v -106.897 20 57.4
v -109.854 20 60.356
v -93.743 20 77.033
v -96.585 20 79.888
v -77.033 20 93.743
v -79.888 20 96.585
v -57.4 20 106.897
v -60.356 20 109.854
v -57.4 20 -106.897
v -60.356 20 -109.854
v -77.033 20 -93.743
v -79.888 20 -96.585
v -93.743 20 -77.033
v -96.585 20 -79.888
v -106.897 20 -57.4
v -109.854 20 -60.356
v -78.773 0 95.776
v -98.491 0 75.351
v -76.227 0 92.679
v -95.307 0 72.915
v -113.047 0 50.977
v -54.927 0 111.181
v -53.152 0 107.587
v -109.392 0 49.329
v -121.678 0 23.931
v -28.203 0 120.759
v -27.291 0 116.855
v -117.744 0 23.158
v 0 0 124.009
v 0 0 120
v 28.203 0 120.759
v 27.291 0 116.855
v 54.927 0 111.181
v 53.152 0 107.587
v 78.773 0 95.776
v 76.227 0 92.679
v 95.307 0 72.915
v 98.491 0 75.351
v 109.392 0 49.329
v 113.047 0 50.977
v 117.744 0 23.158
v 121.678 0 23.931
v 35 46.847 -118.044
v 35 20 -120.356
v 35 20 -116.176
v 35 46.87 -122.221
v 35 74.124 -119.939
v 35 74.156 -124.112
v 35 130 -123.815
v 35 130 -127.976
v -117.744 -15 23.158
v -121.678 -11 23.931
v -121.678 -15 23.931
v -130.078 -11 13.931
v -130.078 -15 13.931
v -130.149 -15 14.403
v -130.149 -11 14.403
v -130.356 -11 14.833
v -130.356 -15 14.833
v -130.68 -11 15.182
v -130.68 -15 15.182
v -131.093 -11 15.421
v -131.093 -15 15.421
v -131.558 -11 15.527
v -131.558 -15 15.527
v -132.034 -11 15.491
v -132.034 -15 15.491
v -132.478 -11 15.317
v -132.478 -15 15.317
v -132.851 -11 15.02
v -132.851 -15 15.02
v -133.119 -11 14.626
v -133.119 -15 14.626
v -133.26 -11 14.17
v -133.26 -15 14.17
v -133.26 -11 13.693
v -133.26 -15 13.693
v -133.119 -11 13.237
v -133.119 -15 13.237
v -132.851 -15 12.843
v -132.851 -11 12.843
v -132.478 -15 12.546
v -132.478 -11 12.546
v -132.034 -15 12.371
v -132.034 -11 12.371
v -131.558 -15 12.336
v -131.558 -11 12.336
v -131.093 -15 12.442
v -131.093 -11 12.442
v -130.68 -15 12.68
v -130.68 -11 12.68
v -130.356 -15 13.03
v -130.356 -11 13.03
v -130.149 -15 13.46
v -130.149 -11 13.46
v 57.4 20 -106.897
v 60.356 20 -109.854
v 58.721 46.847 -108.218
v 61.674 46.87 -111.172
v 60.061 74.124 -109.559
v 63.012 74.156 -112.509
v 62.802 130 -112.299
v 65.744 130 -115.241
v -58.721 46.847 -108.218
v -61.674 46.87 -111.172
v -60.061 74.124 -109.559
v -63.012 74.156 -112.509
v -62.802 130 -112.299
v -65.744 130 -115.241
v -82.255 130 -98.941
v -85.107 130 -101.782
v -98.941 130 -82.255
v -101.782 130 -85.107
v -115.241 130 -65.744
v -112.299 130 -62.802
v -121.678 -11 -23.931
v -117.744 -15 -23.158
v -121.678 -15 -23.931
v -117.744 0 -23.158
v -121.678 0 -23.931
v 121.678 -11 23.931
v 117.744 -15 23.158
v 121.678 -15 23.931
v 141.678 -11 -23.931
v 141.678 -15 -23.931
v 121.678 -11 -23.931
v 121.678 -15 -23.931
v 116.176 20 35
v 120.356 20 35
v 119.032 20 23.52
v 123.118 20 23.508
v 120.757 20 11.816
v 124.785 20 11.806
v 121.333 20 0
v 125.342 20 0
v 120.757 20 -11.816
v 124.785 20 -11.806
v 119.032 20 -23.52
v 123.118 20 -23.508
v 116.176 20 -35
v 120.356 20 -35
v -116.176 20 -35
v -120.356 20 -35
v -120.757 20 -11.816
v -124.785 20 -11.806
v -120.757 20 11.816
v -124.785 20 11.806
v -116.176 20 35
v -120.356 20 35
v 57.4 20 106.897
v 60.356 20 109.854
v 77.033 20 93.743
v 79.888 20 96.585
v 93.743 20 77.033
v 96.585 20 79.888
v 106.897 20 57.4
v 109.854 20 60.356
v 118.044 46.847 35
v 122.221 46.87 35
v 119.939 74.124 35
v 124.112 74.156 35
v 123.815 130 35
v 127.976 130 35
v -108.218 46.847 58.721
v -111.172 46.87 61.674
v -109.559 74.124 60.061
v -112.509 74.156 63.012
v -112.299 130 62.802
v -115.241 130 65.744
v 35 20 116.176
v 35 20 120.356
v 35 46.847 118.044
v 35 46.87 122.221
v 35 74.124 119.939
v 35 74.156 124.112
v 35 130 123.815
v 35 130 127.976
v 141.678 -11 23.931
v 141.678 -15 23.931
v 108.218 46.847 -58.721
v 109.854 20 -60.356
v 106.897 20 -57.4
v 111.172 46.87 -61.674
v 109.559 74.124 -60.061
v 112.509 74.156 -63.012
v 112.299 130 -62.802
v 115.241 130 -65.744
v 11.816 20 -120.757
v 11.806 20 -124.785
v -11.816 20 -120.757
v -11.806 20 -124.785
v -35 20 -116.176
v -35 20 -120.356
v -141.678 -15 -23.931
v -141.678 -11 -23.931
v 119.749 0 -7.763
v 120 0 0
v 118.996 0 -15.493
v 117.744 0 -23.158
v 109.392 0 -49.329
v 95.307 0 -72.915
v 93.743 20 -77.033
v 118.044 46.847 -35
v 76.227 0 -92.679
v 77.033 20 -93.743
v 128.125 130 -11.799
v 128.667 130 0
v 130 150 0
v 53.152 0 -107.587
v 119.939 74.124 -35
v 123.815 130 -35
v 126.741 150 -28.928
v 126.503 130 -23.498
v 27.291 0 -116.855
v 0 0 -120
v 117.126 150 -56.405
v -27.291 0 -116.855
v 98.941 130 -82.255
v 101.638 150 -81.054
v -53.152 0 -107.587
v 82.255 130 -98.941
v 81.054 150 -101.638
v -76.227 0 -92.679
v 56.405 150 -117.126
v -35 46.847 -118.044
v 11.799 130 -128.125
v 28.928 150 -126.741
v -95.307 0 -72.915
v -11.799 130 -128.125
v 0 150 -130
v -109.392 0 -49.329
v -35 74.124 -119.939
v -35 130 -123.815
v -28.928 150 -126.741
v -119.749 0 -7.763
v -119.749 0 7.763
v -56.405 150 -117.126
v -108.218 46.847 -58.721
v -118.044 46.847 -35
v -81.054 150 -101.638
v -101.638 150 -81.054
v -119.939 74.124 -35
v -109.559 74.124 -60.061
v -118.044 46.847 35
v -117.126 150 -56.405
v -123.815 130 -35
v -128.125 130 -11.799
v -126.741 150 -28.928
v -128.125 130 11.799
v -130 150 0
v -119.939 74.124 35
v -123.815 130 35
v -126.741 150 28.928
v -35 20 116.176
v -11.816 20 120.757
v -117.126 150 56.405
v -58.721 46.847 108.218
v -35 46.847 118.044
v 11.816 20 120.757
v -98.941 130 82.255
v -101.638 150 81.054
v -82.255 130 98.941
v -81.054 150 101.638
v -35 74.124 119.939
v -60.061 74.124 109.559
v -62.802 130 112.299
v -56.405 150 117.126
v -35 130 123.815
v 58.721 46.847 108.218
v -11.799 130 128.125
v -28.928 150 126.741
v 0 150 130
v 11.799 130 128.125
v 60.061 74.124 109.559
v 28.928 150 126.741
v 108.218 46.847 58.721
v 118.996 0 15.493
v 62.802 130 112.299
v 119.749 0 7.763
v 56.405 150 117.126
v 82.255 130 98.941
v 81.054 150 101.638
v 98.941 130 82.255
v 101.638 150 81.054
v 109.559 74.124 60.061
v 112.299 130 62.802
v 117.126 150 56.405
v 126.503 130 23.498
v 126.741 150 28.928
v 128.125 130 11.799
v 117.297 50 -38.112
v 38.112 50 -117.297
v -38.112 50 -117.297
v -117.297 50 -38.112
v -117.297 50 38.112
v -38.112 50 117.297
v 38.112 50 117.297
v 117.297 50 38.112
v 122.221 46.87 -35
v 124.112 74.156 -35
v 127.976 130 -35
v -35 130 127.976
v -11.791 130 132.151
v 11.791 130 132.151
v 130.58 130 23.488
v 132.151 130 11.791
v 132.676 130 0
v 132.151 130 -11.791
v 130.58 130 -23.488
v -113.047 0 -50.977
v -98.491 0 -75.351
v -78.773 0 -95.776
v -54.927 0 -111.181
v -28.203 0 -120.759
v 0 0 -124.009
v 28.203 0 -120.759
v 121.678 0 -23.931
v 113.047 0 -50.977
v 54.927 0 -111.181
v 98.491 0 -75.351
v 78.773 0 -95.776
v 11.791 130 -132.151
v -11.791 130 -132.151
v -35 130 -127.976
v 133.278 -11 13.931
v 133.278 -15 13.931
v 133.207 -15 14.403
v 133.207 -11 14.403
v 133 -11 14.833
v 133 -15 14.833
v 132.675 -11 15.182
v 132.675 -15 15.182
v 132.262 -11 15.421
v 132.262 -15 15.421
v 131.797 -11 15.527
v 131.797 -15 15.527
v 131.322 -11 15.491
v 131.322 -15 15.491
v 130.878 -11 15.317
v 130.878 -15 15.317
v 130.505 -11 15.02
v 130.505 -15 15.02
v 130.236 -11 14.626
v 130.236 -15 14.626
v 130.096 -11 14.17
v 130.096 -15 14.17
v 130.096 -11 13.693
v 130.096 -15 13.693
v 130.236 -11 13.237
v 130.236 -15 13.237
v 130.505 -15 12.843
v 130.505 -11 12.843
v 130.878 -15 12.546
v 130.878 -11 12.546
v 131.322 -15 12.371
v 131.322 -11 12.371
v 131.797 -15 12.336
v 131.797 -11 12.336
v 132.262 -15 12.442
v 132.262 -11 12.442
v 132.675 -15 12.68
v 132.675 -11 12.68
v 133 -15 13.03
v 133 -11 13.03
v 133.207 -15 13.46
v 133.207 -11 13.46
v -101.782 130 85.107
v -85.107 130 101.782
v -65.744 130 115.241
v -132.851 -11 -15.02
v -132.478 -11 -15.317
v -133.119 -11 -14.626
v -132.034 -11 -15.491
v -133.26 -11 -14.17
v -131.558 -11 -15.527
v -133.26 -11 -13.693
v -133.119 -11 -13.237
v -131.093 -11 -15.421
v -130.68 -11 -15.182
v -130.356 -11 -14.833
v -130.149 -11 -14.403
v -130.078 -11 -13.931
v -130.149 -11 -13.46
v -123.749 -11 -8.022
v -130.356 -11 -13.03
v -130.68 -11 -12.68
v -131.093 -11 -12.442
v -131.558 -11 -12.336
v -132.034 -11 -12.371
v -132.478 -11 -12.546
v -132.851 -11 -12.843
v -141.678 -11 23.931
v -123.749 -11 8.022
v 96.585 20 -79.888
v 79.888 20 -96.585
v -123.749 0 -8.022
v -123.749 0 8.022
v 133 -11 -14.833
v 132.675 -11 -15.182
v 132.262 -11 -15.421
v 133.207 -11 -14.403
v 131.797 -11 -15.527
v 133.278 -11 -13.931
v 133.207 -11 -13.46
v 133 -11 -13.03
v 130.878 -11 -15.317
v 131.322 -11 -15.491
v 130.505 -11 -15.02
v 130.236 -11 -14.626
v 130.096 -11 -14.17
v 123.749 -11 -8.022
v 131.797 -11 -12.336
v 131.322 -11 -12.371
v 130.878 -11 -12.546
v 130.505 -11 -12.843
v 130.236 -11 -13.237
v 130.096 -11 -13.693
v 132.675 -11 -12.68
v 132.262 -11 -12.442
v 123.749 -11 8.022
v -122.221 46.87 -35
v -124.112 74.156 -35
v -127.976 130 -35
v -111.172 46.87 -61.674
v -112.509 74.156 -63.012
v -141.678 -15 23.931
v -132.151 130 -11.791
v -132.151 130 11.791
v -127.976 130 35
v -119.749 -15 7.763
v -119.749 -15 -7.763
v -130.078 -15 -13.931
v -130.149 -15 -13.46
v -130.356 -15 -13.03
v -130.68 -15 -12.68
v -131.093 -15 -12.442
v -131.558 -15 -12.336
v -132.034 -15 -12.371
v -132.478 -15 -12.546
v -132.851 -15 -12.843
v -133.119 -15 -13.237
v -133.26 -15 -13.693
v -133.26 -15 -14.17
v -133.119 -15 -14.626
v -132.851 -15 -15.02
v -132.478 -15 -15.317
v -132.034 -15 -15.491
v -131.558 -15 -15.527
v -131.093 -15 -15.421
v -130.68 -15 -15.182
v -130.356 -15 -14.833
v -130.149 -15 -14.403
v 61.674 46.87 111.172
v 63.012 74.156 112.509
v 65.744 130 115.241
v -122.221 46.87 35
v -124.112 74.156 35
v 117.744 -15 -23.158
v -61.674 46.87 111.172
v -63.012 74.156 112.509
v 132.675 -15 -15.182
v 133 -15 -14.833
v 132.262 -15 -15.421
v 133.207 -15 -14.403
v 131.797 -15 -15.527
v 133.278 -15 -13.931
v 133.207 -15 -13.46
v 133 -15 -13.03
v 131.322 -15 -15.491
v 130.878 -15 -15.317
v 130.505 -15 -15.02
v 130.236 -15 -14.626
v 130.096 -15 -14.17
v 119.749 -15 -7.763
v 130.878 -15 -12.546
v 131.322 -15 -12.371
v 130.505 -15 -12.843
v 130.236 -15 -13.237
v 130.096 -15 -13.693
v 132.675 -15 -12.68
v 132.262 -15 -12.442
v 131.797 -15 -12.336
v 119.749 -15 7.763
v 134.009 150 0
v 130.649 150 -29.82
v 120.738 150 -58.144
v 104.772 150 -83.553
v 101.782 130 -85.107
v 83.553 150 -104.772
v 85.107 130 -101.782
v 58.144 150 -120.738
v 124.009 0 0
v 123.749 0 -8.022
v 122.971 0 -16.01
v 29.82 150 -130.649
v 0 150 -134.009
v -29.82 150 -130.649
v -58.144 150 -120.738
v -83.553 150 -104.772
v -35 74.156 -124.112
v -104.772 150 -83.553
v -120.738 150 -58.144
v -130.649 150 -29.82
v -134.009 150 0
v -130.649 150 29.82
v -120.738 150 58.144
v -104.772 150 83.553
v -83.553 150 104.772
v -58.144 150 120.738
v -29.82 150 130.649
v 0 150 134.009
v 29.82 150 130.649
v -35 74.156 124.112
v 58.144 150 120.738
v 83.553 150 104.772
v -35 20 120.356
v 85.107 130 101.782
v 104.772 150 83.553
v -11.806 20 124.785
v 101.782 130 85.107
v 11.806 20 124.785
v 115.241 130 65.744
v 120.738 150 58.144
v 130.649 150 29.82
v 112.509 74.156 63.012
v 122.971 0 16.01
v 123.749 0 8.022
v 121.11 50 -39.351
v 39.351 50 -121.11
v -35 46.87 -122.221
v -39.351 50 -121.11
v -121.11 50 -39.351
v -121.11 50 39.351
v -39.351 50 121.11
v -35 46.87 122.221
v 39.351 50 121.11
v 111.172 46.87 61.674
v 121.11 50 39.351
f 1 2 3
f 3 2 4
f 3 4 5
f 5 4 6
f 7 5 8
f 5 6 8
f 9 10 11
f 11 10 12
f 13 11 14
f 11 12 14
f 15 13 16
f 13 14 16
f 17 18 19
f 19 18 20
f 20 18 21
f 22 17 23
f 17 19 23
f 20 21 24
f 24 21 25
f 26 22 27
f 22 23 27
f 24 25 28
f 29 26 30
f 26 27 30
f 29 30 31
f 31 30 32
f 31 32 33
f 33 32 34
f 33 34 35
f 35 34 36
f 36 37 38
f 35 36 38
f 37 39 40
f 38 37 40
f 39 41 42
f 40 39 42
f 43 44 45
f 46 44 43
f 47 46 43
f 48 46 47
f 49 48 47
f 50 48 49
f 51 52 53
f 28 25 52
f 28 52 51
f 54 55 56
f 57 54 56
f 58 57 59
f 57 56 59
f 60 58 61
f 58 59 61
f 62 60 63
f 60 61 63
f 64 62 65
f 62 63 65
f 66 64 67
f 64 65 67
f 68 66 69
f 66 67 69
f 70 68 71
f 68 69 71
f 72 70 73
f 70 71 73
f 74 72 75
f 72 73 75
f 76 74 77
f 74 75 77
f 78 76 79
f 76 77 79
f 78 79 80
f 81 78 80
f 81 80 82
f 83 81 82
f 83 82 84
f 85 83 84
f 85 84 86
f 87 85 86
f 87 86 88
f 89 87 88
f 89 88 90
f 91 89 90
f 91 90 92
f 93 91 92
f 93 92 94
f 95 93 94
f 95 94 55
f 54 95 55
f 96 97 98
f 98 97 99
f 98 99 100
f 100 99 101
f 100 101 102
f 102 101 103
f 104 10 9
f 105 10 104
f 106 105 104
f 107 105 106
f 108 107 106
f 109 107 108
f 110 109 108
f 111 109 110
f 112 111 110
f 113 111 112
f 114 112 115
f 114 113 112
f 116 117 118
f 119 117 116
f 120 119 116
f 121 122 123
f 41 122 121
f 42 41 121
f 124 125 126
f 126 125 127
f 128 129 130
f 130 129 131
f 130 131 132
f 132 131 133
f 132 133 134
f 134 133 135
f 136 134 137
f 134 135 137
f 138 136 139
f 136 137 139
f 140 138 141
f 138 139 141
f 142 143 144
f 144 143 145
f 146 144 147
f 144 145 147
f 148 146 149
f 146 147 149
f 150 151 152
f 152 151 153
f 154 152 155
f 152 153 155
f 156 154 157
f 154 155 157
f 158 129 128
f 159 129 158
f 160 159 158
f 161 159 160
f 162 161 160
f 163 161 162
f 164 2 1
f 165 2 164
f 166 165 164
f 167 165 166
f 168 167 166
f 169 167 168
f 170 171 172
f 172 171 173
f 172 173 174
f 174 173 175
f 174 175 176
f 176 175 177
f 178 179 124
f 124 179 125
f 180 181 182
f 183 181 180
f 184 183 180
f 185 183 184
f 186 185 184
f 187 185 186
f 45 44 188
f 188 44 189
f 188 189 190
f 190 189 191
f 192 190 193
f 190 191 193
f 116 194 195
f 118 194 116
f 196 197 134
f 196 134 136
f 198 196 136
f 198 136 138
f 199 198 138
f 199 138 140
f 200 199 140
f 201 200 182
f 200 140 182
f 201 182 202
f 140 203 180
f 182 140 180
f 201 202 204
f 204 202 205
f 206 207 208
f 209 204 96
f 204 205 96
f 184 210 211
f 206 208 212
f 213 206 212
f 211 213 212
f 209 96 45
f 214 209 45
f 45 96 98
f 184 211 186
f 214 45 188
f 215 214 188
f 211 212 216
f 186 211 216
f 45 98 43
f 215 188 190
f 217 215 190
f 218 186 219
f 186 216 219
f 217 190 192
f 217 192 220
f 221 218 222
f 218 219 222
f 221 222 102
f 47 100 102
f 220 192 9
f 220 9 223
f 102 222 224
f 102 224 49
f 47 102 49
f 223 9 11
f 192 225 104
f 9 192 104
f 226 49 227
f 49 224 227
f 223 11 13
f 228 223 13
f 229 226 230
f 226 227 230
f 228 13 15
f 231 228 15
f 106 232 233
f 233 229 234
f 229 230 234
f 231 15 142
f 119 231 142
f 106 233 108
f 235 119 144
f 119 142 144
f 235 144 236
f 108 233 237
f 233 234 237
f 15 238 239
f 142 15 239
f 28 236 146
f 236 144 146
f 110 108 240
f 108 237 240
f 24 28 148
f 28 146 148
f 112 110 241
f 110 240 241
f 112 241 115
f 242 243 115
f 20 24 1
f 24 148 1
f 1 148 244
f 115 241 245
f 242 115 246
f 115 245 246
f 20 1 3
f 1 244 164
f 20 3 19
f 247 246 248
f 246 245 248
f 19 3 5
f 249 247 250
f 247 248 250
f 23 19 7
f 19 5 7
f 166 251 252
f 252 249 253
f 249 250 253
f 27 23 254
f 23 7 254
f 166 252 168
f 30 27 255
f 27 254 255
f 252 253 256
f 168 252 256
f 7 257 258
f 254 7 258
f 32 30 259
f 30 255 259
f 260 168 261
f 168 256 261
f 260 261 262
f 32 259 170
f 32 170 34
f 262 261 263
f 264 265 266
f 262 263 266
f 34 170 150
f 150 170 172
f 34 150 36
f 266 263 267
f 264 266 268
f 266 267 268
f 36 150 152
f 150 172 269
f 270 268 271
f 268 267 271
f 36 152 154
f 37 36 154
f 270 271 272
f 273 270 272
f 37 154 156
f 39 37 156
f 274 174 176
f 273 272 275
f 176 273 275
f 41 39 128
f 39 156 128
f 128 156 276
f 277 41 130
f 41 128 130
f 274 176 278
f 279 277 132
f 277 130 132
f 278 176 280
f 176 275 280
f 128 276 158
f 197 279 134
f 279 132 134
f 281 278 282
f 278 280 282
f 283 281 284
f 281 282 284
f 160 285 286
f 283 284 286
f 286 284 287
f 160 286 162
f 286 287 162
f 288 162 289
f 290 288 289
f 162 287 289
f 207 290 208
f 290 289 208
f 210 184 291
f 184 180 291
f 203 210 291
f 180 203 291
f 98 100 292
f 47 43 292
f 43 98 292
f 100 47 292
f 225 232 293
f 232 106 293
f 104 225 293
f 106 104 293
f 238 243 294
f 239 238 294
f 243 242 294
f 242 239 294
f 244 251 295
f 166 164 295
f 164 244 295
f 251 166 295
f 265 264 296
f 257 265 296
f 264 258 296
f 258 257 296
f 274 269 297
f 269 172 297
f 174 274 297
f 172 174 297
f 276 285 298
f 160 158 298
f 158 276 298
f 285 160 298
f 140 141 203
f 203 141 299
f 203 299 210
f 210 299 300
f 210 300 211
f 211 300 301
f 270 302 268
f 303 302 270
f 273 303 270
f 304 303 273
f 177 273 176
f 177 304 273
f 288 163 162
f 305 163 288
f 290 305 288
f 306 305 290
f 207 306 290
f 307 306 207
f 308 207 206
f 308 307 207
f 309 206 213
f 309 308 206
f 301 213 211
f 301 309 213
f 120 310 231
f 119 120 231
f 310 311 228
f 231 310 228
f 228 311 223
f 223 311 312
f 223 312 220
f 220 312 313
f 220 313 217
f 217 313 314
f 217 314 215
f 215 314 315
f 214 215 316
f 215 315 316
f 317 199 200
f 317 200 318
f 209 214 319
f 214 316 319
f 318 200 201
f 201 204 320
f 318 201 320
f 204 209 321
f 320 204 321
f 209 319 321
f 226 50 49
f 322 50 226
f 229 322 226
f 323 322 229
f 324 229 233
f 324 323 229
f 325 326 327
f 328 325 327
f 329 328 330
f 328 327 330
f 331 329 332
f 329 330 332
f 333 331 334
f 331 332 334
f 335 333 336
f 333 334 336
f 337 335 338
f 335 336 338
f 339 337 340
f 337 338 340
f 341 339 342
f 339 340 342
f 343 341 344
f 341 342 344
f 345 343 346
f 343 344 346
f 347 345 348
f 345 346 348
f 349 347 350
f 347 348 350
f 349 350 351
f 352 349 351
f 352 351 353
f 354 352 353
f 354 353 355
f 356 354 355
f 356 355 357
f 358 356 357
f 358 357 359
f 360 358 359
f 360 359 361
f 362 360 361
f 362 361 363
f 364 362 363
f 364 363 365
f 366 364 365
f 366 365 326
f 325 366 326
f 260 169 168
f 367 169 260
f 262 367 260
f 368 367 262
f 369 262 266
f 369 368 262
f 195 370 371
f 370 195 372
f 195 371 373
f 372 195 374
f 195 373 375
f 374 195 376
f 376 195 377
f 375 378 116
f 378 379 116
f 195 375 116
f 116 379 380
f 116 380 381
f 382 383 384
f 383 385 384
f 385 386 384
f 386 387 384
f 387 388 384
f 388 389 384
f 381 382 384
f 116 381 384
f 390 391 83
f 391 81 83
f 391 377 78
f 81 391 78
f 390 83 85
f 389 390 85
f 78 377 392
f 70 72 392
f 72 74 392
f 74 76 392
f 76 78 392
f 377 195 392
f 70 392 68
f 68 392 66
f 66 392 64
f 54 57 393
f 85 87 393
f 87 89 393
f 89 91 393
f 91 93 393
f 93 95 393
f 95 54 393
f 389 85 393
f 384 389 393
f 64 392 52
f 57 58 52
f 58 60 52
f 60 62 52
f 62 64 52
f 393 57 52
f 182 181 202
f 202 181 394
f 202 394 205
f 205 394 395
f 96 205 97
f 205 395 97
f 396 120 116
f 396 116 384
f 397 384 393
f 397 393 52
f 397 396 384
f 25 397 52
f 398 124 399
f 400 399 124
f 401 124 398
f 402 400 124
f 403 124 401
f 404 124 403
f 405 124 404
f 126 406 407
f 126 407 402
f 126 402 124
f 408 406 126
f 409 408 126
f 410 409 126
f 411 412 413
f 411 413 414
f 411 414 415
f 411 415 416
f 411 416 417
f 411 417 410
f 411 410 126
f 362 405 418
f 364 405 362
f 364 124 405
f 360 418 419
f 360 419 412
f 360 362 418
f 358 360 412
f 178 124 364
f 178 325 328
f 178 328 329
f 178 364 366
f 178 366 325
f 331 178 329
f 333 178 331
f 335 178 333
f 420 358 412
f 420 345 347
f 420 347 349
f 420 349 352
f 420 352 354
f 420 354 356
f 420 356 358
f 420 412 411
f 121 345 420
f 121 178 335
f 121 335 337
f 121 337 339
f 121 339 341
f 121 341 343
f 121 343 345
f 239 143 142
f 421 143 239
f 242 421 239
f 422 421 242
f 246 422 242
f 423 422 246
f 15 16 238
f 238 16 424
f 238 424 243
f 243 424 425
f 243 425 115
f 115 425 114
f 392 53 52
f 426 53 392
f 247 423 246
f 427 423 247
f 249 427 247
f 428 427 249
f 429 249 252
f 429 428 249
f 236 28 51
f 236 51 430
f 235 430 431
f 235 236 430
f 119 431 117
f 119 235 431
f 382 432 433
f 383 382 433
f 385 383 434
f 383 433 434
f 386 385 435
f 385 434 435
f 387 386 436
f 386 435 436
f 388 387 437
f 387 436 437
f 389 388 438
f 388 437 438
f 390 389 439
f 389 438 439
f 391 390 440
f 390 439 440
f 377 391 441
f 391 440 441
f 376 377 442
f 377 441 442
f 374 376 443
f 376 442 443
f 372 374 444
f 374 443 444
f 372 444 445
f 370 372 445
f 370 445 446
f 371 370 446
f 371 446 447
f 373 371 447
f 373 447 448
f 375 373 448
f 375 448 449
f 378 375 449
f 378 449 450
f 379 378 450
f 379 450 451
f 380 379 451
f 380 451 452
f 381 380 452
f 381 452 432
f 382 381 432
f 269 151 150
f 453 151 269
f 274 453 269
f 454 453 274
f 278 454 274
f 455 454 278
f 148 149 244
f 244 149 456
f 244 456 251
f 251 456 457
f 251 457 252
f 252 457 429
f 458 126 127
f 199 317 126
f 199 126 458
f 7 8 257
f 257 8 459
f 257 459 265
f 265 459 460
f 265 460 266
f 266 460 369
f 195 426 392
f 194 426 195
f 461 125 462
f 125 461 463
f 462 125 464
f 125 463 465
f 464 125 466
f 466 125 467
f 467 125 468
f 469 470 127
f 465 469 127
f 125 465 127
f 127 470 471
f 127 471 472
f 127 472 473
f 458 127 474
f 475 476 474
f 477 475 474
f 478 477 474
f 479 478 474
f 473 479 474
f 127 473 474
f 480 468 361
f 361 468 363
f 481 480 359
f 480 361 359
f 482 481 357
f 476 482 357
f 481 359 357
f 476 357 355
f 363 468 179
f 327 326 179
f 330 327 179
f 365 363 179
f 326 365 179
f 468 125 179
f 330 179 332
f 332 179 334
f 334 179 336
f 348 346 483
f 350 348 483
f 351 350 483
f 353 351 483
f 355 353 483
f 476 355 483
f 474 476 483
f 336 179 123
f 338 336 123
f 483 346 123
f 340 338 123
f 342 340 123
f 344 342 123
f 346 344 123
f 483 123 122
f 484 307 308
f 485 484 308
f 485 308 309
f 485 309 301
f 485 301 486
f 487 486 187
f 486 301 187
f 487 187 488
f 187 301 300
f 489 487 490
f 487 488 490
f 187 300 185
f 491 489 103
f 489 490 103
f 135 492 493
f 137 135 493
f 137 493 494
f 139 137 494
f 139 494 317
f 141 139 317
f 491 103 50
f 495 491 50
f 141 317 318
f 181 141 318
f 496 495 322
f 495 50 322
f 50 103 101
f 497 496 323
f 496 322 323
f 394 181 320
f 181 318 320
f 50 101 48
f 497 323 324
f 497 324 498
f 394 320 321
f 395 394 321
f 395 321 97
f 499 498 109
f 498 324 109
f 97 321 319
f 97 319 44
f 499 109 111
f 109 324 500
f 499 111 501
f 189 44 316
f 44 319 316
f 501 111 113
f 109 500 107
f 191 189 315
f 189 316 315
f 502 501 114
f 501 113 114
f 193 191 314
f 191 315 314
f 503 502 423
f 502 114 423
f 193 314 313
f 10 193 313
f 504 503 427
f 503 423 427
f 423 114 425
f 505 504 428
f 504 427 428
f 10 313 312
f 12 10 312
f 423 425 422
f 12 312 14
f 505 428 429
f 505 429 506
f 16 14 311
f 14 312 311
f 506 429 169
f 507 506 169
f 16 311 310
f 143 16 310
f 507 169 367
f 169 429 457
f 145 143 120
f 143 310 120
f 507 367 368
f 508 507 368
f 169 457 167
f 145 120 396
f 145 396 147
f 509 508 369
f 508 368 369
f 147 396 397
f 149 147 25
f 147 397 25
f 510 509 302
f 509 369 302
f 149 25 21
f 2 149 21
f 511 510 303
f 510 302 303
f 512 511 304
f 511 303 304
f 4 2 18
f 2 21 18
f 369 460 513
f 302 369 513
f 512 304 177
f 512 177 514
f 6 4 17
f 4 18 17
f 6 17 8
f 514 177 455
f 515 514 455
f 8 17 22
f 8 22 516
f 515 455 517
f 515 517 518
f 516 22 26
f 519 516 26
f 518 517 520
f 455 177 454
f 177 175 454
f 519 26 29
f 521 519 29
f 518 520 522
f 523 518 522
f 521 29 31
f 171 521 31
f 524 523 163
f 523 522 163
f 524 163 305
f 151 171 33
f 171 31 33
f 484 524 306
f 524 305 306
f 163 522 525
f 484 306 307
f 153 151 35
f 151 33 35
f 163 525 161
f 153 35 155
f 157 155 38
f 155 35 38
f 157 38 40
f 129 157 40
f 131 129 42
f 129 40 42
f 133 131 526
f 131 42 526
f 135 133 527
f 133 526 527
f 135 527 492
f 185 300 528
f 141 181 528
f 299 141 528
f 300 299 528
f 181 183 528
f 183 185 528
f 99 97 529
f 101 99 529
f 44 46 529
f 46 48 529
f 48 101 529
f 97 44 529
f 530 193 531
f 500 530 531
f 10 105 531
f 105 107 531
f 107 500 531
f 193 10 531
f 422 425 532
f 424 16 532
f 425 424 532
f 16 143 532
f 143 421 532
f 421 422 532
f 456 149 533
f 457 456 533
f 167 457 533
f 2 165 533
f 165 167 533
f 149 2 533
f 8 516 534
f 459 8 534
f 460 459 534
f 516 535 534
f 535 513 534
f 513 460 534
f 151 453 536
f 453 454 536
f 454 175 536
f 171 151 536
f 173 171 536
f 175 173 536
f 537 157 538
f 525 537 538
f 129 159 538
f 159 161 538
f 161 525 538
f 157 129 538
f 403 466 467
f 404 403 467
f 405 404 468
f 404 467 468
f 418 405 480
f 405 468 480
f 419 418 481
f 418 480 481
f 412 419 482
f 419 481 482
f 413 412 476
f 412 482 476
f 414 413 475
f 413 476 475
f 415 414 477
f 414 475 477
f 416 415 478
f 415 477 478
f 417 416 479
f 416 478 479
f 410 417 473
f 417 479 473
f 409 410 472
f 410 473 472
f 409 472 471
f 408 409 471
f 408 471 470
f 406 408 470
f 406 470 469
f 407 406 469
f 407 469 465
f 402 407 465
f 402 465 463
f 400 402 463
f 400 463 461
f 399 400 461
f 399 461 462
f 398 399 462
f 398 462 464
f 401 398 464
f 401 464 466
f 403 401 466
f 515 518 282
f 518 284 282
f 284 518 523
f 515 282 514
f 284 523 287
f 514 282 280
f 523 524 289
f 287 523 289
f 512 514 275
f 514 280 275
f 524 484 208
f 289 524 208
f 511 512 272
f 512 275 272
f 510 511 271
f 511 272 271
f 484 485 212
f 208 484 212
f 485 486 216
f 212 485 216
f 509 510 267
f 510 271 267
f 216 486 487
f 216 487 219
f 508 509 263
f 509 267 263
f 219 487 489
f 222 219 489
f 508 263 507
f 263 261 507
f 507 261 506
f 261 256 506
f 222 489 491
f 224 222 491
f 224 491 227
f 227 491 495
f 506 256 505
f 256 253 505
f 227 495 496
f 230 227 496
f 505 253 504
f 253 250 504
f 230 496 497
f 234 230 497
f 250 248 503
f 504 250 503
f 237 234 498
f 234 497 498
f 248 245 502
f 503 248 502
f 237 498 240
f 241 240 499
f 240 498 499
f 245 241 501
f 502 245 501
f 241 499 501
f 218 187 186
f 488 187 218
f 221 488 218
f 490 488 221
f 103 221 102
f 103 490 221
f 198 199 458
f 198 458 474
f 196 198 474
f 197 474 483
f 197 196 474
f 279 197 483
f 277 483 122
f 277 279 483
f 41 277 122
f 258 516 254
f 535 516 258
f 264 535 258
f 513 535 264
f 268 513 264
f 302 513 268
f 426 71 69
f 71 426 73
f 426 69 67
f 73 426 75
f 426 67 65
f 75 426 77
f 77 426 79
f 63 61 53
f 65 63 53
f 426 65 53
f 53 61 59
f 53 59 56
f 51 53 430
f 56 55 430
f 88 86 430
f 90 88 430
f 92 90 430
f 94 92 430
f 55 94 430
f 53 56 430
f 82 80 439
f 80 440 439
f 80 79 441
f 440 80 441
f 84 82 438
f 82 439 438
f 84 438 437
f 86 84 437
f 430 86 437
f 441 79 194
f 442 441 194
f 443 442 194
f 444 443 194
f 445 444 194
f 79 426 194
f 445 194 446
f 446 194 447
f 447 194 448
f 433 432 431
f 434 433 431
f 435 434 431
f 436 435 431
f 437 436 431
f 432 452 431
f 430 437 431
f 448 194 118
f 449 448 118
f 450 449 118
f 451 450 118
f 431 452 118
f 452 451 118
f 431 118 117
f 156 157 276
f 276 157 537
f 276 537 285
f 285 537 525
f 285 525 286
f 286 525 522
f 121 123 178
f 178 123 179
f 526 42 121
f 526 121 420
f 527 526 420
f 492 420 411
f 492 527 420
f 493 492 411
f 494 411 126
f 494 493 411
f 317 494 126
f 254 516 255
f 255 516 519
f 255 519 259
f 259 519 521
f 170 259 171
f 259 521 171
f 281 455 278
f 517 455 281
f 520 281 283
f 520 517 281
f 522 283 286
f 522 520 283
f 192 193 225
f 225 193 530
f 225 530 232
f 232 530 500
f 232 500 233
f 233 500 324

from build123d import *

# Parameters (mm, degrees)
SKETCH6_W           = 70
SKETCH6_H           = 110
CUT_EXTRUDE2_DEPTH  = 20
BOSS_EXTRUDE1_DEPTH = 15
BOSS_EXTRUDE2_DEPTH = 4
SKETCH9_R           = 1.6
CUT_EXTRUDE3_DEPTH  = 24
CIRPATTERN1_COUNT   = 8


with BuildPart() as part:
    # Sketch2 → Revolve1 (revolve)
    with BuildSketch(Plane.XY):
        Polygon((120, 0), (130, 150), (134.008879034, 150), (124.008879034, 0), align=None)
    revolve(axis=Axis((0, 0, 0), (0, 1, 0)))

    # Sketch6 → Cut-Extrude2 (cut, symmetric)
    with BuildSketch(Plane.XY.offset(134)):
        with Locations((0, 75)):
            Rectangle(SKETCH6_W, SKETCH6_H)
    cut_extrude2 = extrude(amount=CUT_EXTRUDE2_DEPTH, both=True, mode=Mode.SUBTRACT)

    # Sketch7 → Boss-Extrude1 (add)
    with BuildSketch(Plane(origin=(0, 0, 0), x_dir=(1, 0, 0), z_dir=(0, 1, 0))):
        with BuildLine():
            Line((-117.744298431, 23.157724131), (-121.677820509, 23.931361754))
            ThreePointArc((-121.677820509, 23.931361754), (-124.008879034, 0), (-121.677820509, -23.931361754))
            Line((-121.677820509, -23.931361754), (-117.744298431, -23.157724131))
            ThreePointArc((-117.744298431, -23.157724131), (-120, 0), (-117.744298431, 23.157724131))
        make_face()
        with BuildLine():
            Line((117.744298431, -23.157724131), (121.677820509, -23.931361754))
            ThreePointArc((121.677820509, -23.931361754), (124.008879034, 0), (121.677820509, 23.931361754))
            Line((121.677820509, 23.931361754), (117.744298431, 23.157724131))
            ThreePointArc((117.744298431, 23.157724131), (120, 0), (117.744298431, -23.157724131))
        make_face()
    extrude(amount=-BOSS_EXTRUDE1_DEPTH)

    # Sketch8 → Boss-Extrude2 (add)
    with BuildSketch(Plane.XZ.offset(15)):
        with BuildLine():
            Line((121.677820509, 23.931361754), (141.677820509, 23.931361754))
            Line((141.677820509, 23.931361754), (141.677820509, -23.931361754))
            Line((141.677820509, -23.931361754), (121.677820509, -23.931361754))
            ThreePointArc((121.677820509, -23.931361754), (124.008879034, 0), (121.677820509, 23.931361754))
        make_face()
        with BuildLine():
            Line((-121.677820509, 23.931361754), (-141.677820509, 23.931361754))
            Line((-141.677820509, 23.931361754), (-141.677820509, -23.931361754))
            Line((-141.677820509, -23.931361754), (-121.677820509, -23.931361754))
            ThreePointArc((-121.677820509, -23.931361754), (-124.008879034, 0), (-121.677820509, 23.931361754))
        make_face()
    extrude(amount=-BOSS_EXTRUDE2_DEPTH)

    # Sketch9 → Cut-Extrude3 (cut)
    with BuildSketch(Plane.XZ.offset(15)):
        with Locations((131.677820509, 13.931361754)):
            Circle(SKETCH9_R)
        with Locations((131.677820509, -13.931361754)):
            Circle(SKETCH9_R)
        with Locations((-131.677820509, -13.931361754)):
            Circle(SKETCH9_R)
        with Locations((-131.677820509, 13.931361754)):
            Circle(SKETCH9_R)
    extrude(amount=-CUT_EXTRUDE3_DEPTH, mode=Mode.SUBTRACT)

    # CirPattern1: Cut-Extrude2 ×8 about axis
    cirpattern1_axis = Axis((0, 0, 0), (0, 1, 0))
    for i in range(1, CIRPATTERN1_COUNT):
        add(cut_extrude2.rotate(cirpattern1_axis, i * 360 / CIRPATTERN1_COUNT), mode=Mode.SUBTRACT)


solid = part.part
